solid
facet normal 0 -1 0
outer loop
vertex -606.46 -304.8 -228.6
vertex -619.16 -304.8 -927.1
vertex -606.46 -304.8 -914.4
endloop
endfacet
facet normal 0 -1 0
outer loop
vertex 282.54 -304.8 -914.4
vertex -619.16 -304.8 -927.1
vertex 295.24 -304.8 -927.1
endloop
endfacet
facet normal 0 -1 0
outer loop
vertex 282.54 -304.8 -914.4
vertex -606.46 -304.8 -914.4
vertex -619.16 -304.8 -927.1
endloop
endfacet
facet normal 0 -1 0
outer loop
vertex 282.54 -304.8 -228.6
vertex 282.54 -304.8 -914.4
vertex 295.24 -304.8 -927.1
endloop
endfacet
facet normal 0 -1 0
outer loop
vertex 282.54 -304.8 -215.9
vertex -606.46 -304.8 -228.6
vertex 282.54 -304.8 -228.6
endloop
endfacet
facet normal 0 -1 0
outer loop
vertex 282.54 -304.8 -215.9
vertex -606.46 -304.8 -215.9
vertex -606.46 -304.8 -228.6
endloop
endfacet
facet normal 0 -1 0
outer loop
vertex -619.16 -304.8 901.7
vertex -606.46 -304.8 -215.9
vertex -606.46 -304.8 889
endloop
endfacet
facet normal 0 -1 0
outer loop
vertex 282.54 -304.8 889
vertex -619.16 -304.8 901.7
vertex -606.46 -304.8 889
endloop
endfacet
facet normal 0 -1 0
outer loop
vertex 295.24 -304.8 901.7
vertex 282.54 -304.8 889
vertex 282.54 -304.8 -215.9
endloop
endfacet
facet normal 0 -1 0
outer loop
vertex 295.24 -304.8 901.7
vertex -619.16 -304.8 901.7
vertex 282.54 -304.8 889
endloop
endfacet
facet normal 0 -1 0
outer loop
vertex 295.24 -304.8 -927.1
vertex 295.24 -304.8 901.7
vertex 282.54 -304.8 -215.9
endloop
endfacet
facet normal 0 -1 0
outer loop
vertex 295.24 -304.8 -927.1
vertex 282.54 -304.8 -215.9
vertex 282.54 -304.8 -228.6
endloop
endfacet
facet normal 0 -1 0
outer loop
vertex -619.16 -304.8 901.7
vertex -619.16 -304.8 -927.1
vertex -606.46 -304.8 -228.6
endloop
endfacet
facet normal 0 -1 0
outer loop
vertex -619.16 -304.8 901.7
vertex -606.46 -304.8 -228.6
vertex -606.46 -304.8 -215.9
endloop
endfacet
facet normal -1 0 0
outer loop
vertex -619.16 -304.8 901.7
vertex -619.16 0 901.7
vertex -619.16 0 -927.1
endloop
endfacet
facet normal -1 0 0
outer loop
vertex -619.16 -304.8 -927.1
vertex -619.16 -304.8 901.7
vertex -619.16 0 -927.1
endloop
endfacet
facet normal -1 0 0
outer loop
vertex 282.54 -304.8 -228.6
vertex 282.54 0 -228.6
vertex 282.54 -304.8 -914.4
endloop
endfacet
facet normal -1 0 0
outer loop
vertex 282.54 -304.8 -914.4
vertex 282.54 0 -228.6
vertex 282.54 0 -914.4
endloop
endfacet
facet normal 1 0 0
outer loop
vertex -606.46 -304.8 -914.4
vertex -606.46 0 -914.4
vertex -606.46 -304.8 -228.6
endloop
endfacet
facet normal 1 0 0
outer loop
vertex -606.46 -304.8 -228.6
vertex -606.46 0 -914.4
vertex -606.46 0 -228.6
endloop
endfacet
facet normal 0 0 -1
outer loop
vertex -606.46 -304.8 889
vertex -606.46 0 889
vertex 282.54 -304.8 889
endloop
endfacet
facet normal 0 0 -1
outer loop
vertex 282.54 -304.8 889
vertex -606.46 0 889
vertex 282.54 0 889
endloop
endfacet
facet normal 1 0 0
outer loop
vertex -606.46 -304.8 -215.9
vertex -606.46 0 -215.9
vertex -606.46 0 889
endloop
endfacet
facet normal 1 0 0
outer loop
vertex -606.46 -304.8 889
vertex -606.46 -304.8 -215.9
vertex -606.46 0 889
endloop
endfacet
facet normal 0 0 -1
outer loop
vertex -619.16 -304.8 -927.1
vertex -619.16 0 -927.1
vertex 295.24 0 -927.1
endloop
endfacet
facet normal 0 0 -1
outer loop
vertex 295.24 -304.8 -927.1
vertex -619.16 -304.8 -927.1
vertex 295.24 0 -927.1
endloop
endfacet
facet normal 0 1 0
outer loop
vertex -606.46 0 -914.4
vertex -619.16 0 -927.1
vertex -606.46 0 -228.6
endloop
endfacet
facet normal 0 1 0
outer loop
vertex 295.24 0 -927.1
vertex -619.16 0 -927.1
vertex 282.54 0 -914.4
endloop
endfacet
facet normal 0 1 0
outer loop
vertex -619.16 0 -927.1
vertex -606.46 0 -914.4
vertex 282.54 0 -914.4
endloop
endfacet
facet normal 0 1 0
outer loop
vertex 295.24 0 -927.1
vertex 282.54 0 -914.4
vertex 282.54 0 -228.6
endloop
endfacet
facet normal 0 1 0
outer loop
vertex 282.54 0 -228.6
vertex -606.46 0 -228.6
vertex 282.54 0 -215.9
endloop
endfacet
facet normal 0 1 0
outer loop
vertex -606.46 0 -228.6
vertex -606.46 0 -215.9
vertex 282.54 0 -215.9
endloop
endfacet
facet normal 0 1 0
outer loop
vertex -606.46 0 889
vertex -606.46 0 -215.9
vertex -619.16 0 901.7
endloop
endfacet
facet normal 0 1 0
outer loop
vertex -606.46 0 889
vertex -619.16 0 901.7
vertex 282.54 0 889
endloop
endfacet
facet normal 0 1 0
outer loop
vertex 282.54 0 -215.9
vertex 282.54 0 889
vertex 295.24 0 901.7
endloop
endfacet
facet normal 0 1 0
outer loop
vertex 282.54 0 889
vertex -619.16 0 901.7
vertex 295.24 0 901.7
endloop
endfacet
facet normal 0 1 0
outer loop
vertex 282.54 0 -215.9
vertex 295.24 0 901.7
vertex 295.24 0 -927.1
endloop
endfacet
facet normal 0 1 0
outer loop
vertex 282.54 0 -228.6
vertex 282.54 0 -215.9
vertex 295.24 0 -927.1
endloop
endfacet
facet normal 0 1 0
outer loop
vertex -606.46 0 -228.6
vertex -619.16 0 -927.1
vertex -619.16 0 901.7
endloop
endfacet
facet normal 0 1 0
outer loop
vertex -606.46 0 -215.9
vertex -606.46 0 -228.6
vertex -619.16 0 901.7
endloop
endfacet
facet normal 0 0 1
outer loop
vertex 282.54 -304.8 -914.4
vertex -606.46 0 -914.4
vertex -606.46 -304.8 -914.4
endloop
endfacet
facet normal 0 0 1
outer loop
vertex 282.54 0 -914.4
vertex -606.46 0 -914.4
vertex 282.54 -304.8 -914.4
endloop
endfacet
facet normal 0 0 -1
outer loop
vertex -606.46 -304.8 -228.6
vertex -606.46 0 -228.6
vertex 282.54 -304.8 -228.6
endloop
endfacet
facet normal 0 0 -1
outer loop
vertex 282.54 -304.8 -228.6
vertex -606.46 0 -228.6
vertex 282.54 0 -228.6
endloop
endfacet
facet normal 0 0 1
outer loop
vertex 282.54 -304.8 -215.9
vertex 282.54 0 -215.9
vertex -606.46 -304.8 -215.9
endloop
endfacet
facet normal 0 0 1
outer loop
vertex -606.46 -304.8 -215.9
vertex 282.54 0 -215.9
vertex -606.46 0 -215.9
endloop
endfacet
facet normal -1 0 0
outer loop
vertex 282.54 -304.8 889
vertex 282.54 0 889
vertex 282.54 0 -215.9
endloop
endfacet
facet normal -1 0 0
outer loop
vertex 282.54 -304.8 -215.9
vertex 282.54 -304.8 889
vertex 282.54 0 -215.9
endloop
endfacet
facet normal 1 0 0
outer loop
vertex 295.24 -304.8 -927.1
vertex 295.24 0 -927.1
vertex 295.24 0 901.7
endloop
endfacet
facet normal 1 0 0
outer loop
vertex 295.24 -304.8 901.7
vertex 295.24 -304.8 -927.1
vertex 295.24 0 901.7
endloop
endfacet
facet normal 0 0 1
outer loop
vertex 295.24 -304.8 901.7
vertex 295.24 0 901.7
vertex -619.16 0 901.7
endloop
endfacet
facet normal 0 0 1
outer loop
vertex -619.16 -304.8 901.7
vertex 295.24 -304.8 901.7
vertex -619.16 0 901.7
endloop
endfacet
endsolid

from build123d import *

# Parameters (mm, degrees)
F0_W     = 889
F0_H     = 12.7
F1_DEPTH = 304.8


with BuildPart() as f1:
    # F0 (on Front) → F1 (new body)
    with BuildSketch(Plane.XZ):
        with Locations((-161.960473, 895.35)):
            Rectangle(F0_W, F0_H)
        Polygon((-606.460473, 889), (-606.460473, 901.7), (-619.160473, 901.7), (-619.160473, -927.1), (-606.460473, -927.1), (-606.460473, -914.4), (-606.460473, -609.6), (-606.460473, -596.9), (-606.460473, -419.1), (-606.460473, -406.4), (-606.460473, -228.6), (-606.460473, -215.9), (-606.460473, -63.5), (-606.460473, -50.8), (-606.460473, 76.2), (-606.460473, 88.9), (-606.460473, 215.9), (-606.460473, 228.6), (-606.460473, 304.8), (-606.460473, 317.5), (-606.460473, 393.7), (-606.460473, 406.4), (-606.460473, 469.9), (-606.460473, 482.6), align=None)
        Polygon((295.239527, 901.7), (282.539527, 901.7), (282.539527, 889), (282.539527, 482.6), (282.539527, 469.9), (282.539527, -215.9), (282.539527, -228.6), (282.539527, -406.4), (282.539527, -419.1), (282.539527, -596.9), (282.539527, -609.6), (282.539527, -914.4), (282.539527, -927.1), (295.239527, -927.1), align=None)
        with Locations((-161.960473, -920.75)):
            Rectangle(F0_W, F0_H)
        Polygon((282.539527, -228.6), (282.539527, -215.9), (257.139527, -215.9), (-200.060473, -215.9), (-225.460473, -215.9), (-238.160473, -215.9), (-606.460473, -215.9), (-606.460473, -228.6), align=None)
    extrude(amount=F1_DEPTH)


solid = f1.part
